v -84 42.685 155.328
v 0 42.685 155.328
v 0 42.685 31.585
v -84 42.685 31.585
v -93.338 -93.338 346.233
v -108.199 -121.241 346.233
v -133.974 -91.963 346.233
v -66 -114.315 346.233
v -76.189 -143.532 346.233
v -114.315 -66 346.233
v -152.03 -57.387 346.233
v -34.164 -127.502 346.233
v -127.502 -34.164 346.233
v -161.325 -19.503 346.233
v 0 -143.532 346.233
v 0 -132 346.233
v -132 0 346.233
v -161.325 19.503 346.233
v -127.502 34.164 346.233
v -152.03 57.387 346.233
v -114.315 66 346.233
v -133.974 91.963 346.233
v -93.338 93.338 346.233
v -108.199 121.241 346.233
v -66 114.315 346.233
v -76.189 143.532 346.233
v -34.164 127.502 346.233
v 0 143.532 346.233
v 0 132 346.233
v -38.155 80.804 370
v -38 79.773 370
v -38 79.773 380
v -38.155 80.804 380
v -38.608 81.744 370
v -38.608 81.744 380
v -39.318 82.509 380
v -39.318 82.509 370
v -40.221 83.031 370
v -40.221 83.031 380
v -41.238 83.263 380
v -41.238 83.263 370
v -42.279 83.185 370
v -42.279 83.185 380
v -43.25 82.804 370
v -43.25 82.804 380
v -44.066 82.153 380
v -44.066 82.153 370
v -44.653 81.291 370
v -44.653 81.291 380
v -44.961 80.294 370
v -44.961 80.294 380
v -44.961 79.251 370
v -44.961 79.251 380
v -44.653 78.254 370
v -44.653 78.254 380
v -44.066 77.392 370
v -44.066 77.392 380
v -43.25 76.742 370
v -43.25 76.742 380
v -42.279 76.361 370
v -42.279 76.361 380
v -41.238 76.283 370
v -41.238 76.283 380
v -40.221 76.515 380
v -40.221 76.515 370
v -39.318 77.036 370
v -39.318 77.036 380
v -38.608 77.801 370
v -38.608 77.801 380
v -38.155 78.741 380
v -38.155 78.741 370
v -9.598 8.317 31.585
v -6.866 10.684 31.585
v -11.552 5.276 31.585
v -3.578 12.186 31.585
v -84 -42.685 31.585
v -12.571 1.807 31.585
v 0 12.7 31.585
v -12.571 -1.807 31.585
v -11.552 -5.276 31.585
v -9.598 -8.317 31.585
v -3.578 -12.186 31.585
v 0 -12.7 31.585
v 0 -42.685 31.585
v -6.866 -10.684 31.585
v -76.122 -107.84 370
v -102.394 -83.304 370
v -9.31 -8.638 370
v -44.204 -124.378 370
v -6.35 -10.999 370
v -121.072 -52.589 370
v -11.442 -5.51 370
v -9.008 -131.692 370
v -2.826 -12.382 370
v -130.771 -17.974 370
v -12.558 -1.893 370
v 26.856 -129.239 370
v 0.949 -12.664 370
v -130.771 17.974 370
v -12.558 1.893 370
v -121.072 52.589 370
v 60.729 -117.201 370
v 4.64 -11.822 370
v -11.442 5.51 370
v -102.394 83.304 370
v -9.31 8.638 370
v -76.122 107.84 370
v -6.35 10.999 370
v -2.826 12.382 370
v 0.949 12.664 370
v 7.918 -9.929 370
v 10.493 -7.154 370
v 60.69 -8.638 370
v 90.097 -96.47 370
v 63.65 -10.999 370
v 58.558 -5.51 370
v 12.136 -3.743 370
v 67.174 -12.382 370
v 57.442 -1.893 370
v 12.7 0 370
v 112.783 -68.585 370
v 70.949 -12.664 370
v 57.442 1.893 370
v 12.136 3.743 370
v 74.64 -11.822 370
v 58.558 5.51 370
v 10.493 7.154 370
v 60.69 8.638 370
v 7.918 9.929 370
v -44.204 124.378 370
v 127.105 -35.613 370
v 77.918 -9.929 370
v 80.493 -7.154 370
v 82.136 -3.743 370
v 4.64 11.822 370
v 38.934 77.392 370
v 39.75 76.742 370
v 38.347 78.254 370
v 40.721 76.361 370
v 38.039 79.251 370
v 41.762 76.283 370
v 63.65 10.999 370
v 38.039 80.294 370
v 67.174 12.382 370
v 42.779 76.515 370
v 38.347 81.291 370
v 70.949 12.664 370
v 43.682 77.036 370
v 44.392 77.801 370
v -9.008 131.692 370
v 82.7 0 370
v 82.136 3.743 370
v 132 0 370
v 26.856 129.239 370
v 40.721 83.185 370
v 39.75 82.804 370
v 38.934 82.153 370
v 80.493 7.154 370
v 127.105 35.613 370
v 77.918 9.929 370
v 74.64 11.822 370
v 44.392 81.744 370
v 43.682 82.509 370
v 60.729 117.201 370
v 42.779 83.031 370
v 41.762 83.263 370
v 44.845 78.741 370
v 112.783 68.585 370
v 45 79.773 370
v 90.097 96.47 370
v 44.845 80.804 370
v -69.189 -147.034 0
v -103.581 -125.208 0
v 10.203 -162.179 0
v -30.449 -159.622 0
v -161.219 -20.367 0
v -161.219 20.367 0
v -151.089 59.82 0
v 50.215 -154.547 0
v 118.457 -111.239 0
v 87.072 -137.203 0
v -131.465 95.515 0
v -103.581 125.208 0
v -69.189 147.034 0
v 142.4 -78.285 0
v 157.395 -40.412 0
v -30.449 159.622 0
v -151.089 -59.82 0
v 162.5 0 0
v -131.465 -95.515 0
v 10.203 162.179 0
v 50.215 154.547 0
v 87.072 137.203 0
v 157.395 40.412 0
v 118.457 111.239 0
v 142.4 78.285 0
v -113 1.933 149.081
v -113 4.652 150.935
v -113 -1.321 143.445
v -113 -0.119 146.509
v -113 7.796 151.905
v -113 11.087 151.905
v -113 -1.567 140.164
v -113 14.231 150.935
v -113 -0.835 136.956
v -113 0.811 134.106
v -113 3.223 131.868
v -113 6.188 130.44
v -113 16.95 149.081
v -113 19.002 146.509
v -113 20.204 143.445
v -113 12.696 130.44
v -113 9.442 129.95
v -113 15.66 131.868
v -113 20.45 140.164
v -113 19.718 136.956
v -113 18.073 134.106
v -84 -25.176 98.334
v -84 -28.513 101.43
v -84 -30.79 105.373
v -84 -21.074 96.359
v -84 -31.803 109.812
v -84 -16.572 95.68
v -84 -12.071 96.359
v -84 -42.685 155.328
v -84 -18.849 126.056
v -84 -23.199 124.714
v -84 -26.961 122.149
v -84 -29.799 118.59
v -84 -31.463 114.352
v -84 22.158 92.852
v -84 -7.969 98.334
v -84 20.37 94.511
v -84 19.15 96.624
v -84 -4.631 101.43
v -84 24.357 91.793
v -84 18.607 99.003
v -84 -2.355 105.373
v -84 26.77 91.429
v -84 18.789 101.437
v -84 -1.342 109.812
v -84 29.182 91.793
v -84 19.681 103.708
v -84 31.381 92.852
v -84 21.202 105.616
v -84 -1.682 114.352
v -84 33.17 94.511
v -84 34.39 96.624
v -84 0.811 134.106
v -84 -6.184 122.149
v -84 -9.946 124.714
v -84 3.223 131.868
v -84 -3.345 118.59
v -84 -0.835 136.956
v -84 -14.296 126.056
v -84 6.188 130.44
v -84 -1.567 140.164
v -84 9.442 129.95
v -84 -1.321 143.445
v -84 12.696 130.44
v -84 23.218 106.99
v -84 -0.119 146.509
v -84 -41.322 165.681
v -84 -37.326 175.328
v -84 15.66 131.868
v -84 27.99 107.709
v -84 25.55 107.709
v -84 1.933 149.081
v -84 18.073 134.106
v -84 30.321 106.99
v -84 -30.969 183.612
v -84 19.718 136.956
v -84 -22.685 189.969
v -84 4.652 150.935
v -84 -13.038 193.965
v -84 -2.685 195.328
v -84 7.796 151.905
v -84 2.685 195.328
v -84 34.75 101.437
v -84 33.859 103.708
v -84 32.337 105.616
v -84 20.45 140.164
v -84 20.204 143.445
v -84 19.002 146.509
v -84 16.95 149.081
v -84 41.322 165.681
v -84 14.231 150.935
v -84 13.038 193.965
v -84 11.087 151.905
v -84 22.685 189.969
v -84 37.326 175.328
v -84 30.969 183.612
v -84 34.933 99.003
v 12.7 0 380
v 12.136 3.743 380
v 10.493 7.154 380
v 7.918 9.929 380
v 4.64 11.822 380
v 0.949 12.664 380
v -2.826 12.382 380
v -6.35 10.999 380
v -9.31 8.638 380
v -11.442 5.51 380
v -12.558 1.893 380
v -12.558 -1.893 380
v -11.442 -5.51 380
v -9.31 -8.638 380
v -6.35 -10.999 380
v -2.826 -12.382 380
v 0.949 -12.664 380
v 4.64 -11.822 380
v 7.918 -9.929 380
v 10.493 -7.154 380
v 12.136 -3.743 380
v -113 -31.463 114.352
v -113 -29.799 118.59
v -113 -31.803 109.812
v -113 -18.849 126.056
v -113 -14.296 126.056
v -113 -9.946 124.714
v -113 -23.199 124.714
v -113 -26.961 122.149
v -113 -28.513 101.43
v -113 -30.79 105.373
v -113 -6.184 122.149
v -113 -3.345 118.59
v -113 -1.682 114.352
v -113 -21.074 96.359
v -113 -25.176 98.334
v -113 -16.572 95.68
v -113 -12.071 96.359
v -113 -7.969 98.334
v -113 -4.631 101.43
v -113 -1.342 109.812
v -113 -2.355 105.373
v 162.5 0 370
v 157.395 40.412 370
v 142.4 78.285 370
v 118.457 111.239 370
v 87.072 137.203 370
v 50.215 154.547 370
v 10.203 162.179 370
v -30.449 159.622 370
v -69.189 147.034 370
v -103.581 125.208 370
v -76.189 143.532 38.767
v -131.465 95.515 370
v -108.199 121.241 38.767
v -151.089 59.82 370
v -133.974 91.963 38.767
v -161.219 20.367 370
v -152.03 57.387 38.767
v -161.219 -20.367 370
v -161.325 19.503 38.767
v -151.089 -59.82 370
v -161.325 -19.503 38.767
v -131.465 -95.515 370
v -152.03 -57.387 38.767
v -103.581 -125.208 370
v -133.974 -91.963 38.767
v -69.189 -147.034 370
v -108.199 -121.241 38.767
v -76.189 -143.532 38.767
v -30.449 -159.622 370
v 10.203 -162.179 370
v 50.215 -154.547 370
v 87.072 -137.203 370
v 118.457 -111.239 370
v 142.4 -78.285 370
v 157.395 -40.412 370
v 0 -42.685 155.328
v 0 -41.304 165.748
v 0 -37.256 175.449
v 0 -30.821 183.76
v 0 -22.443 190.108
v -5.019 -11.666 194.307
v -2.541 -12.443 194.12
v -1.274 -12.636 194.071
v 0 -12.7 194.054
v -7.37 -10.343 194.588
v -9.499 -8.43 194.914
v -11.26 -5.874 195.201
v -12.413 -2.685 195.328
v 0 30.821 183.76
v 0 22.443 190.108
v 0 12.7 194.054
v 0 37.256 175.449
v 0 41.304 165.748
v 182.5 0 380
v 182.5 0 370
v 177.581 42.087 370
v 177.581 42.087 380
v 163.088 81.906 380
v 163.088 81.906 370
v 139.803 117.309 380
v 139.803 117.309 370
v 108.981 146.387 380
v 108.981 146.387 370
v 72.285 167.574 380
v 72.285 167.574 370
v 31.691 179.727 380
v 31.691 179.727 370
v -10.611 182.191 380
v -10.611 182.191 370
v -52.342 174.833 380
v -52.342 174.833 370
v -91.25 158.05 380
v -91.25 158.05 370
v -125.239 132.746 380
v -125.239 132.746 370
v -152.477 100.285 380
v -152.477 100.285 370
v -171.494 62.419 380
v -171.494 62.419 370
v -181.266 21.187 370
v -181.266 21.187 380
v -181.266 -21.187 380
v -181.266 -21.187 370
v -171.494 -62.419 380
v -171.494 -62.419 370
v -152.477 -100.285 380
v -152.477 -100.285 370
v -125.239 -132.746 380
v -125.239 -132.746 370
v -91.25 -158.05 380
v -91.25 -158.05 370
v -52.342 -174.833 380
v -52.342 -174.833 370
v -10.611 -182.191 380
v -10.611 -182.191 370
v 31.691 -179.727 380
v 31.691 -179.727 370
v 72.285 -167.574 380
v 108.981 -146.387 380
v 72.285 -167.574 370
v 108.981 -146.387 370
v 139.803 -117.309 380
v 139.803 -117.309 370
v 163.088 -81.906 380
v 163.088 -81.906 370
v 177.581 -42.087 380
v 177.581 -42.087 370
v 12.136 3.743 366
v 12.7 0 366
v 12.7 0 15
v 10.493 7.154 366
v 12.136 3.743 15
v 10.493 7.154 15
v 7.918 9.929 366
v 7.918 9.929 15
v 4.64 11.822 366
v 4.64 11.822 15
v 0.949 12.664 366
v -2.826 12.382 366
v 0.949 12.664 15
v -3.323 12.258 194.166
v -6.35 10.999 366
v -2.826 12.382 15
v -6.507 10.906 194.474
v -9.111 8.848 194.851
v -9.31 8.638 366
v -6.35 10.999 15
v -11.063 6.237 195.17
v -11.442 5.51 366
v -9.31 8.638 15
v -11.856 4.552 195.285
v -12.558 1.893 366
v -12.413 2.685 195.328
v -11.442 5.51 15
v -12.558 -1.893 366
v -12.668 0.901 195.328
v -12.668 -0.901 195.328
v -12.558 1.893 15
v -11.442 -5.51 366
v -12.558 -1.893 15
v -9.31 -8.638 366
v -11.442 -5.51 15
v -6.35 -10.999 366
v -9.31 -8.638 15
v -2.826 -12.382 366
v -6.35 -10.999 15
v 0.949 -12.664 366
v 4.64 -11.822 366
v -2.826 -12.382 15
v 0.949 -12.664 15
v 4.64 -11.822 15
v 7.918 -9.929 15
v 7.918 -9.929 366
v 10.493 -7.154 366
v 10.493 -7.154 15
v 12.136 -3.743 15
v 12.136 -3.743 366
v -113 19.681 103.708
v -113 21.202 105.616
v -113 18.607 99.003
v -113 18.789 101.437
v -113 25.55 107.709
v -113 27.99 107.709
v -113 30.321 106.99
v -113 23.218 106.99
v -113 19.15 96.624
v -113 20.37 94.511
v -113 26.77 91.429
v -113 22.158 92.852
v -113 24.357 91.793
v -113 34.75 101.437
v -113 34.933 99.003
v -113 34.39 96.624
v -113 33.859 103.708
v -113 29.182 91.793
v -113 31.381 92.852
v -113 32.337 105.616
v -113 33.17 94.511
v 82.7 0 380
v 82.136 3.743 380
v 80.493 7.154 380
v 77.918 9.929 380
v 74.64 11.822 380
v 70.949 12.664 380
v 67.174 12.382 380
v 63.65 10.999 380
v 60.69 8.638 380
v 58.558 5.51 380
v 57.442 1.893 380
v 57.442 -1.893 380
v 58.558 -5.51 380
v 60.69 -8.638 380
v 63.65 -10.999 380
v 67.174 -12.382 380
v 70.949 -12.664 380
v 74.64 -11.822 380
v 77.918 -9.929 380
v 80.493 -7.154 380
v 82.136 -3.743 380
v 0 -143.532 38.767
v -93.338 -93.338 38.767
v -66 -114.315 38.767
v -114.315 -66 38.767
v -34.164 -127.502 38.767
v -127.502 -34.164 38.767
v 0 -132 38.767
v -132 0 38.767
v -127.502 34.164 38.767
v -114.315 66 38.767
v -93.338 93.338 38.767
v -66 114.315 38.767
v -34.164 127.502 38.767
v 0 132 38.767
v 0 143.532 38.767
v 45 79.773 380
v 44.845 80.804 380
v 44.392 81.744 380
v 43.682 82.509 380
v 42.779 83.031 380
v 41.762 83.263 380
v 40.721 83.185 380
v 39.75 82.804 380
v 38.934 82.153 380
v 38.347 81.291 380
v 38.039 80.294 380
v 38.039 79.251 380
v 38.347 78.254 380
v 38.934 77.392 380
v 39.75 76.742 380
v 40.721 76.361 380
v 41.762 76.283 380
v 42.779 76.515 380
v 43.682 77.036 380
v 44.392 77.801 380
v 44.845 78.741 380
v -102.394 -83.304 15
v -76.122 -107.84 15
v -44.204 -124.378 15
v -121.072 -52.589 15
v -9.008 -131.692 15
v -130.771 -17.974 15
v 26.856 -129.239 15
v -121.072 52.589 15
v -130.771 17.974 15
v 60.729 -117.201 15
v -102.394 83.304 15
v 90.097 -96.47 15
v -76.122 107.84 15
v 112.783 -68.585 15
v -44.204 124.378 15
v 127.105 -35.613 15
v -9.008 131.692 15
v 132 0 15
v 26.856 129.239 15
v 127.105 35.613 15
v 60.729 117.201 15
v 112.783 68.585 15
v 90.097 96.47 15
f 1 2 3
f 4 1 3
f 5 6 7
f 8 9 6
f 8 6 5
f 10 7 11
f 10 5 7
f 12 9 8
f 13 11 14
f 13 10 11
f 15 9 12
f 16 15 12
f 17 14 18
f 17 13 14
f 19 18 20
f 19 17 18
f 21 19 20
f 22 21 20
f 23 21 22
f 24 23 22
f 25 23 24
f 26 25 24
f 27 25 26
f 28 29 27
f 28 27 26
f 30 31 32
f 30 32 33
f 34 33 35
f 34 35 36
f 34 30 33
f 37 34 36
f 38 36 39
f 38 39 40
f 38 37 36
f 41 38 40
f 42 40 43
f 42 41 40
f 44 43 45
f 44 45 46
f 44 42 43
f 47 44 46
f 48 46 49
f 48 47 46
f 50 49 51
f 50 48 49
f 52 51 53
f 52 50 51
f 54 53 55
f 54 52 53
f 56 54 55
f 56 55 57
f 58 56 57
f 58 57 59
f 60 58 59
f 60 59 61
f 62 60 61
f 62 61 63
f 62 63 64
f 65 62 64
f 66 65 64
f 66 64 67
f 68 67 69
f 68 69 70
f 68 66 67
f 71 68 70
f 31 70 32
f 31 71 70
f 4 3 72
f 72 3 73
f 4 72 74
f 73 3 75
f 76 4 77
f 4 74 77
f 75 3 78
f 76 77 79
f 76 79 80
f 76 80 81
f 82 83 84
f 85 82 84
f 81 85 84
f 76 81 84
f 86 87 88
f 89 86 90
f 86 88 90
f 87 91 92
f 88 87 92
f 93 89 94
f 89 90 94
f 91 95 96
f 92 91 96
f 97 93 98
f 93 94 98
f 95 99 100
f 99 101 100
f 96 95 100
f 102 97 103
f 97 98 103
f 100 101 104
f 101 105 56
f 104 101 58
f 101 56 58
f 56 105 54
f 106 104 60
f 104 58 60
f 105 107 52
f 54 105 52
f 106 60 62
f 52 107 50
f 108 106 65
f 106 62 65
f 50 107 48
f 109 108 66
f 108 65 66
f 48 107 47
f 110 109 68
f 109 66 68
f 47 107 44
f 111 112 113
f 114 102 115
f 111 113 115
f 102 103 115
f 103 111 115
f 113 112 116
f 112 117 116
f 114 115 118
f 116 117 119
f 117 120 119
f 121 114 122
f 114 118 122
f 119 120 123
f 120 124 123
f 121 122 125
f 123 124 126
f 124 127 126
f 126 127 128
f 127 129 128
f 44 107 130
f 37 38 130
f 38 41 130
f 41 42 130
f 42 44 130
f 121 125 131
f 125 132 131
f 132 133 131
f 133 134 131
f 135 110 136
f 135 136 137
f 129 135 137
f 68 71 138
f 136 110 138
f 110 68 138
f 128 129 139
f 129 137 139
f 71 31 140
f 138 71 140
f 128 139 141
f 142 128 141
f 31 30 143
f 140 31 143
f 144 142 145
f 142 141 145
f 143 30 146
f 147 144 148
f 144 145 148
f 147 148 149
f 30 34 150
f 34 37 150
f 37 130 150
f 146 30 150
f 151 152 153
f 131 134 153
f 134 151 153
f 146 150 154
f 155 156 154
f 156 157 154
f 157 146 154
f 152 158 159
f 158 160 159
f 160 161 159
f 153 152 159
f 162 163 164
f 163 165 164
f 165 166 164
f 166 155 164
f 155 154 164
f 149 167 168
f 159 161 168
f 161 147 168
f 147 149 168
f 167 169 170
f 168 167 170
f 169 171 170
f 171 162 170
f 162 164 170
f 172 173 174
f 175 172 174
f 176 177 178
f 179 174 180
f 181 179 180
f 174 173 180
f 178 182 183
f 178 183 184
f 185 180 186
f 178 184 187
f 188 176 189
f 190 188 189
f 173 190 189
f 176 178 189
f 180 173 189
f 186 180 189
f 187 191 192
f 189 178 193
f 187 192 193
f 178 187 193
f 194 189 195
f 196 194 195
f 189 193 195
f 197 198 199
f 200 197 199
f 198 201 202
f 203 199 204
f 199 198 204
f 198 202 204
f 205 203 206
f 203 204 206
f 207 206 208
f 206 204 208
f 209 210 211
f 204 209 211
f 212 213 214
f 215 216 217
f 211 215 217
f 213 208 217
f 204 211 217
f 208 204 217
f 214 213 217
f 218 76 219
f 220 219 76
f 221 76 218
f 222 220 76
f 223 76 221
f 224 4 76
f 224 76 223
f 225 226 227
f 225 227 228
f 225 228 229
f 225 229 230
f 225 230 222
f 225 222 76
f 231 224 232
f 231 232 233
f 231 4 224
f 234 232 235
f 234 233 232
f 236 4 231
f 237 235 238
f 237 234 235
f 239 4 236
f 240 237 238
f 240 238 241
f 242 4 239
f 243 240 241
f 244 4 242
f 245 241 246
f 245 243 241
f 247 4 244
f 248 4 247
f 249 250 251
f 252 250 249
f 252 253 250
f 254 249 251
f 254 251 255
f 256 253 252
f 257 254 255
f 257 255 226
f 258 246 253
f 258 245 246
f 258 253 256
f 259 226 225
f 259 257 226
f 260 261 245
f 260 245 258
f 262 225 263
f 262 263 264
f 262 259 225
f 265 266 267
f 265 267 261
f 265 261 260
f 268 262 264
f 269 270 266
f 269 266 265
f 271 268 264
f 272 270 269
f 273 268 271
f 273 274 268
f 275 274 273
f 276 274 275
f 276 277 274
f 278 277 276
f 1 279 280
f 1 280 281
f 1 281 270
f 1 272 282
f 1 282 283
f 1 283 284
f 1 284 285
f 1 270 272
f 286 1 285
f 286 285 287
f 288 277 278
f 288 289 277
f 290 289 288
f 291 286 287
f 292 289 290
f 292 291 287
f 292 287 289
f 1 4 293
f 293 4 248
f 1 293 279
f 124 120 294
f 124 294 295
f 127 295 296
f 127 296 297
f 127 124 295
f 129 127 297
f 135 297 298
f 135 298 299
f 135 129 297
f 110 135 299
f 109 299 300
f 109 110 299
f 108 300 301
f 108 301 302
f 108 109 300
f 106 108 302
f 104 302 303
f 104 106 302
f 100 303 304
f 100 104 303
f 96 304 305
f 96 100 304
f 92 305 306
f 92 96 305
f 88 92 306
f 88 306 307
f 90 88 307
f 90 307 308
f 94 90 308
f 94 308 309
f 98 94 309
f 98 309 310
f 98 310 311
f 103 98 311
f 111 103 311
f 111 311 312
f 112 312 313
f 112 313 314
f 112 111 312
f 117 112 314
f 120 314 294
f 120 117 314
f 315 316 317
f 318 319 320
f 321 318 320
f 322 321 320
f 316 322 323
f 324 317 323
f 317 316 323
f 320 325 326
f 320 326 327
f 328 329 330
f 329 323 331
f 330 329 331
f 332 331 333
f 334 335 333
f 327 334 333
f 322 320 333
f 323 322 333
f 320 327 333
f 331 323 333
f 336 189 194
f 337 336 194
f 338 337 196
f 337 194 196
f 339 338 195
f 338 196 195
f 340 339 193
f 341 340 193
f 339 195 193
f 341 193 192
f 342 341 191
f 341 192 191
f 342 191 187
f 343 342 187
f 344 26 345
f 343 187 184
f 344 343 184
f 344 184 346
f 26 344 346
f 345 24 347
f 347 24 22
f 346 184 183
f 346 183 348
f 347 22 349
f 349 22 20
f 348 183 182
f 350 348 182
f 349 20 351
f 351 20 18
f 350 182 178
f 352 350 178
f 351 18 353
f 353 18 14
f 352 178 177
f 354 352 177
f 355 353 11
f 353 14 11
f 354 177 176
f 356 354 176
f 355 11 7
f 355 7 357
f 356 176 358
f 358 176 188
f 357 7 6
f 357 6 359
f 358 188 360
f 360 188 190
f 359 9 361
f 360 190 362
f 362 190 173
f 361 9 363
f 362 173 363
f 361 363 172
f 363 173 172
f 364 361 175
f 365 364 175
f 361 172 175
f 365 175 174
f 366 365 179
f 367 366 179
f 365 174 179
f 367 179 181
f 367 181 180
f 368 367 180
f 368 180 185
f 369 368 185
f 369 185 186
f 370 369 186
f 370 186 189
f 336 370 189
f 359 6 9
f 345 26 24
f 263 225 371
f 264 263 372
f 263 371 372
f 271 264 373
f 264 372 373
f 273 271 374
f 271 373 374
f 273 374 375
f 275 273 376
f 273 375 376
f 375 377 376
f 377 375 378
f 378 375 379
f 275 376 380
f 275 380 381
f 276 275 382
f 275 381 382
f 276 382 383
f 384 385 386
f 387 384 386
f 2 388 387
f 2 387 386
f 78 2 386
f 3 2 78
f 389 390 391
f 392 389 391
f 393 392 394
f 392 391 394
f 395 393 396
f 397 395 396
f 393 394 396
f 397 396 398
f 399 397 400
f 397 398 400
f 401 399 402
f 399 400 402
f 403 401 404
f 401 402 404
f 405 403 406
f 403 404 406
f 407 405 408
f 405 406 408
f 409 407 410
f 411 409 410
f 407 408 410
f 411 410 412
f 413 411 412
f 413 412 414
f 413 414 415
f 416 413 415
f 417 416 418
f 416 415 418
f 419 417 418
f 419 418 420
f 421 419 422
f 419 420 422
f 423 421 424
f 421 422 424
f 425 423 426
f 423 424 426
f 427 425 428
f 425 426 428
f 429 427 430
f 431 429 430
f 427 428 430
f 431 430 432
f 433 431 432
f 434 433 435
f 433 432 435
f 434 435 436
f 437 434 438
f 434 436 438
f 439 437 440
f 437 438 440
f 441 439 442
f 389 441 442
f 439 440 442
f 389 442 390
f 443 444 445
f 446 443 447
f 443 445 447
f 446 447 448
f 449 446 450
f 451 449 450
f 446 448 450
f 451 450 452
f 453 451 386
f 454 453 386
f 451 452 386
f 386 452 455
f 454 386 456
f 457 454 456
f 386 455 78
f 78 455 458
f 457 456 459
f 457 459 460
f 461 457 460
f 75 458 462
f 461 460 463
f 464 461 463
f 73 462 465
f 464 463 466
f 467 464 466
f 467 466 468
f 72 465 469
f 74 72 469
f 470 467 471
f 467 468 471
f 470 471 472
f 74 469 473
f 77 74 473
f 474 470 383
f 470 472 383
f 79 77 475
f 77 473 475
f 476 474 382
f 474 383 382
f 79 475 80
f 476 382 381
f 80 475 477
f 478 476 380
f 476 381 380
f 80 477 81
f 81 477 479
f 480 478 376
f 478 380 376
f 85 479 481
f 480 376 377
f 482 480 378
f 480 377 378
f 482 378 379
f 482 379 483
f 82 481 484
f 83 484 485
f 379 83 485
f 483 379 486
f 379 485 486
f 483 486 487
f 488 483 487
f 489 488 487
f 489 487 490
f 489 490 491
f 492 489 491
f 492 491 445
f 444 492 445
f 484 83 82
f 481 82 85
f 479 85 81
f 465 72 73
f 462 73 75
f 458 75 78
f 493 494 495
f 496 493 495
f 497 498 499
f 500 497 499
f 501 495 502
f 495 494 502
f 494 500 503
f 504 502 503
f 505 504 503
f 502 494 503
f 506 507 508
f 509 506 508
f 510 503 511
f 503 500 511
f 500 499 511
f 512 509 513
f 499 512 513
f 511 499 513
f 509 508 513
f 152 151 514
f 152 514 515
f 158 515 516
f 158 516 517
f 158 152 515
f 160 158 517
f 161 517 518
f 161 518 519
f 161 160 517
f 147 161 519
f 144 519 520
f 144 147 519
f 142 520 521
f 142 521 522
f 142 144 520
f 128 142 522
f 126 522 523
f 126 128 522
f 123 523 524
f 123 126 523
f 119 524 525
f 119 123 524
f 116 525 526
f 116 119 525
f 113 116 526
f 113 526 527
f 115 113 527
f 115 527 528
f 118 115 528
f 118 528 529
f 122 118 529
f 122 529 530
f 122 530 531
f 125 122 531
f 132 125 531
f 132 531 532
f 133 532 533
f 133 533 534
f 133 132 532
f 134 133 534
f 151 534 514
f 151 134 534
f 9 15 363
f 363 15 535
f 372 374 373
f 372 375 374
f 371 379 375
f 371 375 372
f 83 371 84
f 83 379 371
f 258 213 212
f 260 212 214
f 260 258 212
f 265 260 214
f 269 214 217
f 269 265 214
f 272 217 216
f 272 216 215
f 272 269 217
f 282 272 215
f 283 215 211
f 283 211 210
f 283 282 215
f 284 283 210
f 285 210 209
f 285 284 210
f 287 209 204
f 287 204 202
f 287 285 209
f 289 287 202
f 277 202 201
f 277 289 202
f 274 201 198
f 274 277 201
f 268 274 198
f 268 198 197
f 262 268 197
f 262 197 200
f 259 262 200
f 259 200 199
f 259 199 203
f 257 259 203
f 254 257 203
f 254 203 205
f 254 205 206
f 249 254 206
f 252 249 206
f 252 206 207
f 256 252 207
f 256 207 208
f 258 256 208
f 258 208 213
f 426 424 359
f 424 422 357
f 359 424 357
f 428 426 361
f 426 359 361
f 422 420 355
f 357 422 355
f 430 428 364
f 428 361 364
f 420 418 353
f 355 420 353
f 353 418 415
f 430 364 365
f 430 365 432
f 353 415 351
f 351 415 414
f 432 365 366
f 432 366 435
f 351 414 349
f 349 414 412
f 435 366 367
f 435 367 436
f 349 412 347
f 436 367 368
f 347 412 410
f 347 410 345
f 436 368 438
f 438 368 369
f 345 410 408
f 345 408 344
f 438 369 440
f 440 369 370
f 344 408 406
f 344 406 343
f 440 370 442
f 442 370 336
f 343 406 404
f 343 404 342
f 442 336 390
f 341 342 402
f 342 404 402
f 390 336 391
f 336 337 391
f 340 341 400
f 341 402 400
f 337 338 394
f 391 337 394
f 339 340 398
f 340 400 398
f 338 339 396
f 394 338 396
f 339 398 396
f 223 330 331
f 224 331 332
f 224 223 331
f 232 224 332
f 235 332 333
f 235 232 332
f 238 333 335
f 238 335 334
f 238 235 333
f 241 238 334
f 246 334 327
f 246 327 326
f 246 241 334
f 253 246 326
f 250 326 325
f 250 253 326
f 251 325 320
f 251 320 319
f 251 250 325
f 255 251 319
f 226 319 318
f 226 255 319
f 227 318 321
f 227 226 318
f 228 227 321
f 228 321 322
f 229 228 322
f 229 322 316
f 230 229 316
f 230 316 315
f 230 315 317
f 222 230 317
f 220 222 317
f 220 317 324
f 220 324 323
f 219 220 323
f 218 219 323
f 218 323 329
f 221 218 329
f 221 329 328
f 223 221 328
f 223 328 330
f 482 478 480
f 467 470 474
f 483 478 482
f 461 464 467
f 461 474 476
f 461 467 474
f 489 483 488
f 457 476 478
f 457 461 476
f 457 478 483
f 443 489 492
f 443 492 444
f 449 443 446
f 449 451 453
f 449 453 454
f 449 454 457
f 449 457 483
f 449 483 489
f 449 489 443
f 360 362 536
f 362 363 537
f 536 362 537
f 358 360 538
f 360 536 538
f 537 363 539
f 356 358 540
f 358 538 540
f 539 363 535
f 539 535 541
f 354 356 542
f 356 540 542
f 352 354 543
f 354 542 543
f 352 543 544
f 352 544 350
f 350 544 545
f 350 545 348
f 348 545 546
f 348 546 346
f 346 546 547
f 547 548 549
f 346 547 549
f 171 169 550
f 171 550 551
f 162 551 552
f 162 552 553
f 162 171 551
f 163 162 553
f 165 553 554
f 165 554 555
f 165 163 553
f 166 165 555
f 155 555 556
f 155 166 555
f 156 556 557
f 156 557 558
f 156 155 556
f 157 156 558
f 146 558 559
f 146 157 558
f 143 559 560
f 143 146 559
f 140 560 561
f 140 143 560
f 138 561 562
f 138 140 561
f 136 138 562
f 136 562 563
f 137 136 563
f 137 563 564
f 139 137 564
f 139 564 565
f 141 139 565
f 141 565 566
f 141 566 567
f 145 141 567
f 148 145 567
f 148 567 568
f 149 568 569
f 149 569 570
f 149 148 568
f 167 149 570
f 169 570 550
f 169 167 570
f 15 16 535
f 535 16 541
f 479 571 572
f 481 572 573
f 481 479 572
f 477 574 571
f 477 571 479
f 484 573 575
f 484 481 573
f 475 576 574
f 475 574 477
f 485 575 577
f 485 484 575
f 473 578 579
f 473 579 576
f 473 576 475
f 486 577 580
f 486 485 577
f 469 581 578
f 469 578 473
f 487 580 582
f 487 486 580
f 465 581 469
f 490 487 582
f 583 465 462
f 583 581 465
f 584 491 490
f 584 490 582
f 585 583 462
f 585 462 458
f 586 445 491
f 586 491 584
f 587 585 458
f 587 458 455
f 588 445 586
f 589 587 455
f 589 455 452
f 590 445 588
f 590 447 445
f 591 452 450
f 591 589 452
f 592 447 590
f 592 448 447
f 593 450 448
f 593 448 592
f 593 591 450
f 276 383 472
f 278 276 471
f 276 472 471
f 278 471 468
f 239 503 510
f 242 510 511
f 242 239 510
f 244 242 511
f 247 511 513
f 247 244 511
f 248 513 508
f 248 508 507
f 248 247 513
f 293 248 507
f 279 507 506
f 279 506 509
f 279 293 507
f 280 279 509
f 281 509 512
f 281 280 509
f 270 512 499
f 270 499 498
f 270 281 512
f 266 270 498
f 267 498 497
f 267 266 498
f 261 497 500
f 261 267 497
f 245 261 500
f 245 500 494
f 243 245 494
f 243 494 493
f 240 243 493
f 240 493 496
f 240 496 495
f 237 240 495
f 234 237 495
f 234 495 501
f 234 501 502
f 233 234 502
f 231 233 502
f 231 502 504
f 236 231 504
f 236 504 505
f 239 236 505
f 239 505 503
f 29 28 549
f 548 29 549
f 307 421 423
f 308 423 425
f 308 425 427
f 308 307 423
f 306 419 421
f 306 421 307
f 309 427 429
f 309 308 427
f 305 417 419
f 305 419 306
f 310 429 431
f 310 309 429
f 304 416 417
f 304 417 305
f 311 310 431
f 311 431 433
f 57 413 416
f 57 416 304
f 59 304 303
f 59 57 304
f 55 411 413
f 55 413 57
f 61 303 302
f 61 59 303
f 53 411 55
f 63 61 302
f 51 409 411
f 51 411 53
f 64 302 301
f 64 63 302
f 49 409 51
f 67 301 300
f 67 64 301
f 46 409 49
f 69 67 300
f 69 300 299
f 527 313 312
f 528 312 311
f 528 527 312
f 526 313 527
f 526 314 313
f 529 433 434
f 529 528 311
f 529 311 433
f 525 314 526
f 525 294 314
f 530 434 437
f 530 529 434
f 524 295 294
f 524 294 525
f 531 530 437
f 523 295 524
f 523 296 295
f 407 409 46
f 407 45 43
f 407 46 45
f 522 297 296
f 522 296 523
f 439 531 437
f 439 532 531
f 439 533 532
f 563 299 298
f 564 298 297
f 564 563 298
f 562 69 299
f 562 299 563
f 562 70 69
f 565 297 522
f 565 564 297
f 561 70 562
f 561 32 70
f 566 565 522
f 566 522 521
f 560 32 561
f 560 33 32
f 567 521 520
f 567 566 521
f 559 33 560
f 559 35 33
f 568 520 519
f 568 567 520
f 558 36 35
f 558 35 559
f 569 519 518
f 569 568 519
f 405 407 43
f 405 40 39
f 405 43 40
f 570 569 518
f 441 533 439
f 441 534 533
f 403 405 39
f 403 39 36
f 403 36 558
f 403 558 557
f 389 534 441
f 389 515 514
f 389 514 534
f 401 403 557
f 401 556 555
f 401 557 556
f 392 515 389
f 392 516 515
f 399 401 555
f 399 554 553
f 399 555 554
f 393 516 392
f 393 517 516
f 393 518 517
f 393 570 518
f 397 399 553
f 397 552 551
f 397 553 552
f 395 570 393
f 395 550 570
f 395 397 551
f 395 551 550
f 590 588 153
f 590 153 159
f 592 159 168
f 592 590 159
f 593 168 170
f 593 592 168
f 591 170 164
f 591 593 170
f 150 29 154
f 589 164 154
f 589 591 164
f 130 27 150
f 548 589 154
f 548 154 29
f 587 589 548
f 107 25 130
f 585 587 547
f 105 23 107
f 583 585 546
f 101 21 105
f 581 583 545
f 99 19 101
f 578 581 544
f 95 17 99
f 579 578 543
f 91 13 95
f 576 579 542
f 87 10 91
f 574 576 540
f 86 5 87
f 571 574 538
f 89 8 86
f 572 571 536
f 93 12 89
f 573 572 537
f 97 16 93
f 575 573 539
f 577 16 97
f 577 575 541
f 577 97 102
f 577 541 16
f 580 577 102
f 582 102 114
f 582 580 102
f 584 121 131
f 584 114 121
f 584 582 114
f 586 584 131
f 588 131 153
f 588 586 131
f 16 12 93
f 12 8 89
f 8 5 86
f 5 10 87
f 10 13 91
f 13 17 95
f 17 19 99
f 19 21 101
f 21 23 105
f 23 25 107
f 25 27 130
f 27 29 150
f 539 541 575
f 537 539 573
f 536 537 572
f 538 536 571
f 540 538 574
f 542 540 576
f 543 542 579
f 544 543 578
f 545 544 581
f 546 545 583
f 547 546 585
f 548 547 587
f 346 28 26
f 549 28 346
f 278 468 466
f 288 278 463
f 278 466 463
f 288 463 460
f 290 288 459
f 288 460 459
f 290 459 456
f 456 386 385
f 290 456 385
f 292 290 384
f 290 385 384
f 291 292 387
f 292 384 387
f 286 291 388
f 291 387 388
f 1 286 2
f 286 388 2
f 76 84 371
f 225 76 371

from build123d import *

# Parameters (mm, degrees)
CROQUIS1_R              = 162.5
SALIENTE_EXTRUIR1_DEPTH = 370
CROQUIS2_R              = 132
CORTAR_EXTRUIR1_DEPTH   = 417
CROQUIS3_W              = 307.465117838
CROQUIS3_H              = 287.064574964
CORTAR_EXTRUIR2_DEPTH   = 417
CROQUIS4_R              = 182.5
CROQUIS4_R_2            = 12.7
CROQUIS4_R_3            = 3.5
SALIENTE_EXTRUIR2_DEPTH = 10
SALIENTE_EXTRUIR3_DEPTH = 84
CROQUIS6_R              = 11.039446922
CROQUIS6_R_2            = 15.273211948
CROQUIS6_R_3            = 8.18574154
SALIENTE_EXTRUIR4_DEPTH = 113
CROQUIS7_R              = 12.7
SALIENTE_EXTRUIR5_DEPTH = 351


with BuildPart() as part:
    # Croquis1 → Saliente-Extruir1 (new body)
    with BuildSketch(Plane.XY):
        Circle(CROQUIS1_R)
    extrude(amount=SALIENTE_EXTRUIR1_DEPTH)

    # Croquis2 → Cortar-Extruir1 (cut)
    with BuildSketch(Plane.XY.offset(15)):
        Circle(CROQUIS2_R)
    extrude(amount=CORTAR_EXTRUIR1_DEPTH, mode=Mode.SUBTRACT)

    # Croquis3 → Cortar-Extruir2 (cut)
    with BuildSketch(Plane(origin=(0, 0, 0), x_dir=(0, 0, -1), z_dir=(1, 0, 0))):
        with Locations((-192.5, 0)):
            Rectangle(CROQUIS3_W, CROQUIS3_H)
    extrude(amount=-CORTAR_EXTRUIR2_DEPTH, mode=Mode.SUBTRACT)

    # Croquis4 → Saliente-Extruir2 (add)
    with BuildSketch(Plane.XY.offset(370)):
        Circle(CROQUIS4_R)
        Circle(CROQUIS4_R_2, mode=Mode.SUBTRACT)
        with Locations((70, 0)):
            Circle(CROQUIS4_R_2, mode=Mode.SUBTRACT)
        with Locations((-41.5, 79.772762666)):
            Circle(CROQUIS4_R_3, mode=Mode.SUBTRACT)
        with Locations((41.5, 79.772762666)):
            Circle(CROQUIS4_R_3, mode=Mode.SUBTRACT)
    extrude(amount=SALIENTE_EXTRUIR2_DEPTH)



with BuildPart() as body_2:
    # Croquis5 → Saliente-Extruir3 (new body)
    with BuildSketch(Plane(origin=(0, 0, 0), x_dir=(0, 0, -1), z_dir=(1, 0, 0))):
        with BuildLine():
            Line((-155.328170247, 42.685027874), (-31.585382794, 42.685027874))
            Line((-31.585382794, 42.685027874), (-31.585382794, -42.685027874))
            Line((-31.585382794, -42.685027874), (-155.328170247, -42.685027874))
            ThreePointArc((-155.328170247, -42.685027874), (-183.612441494, -30.969299122), (-195.328170247, -2.685027874))
            Line((-195.328170247, -2.685027874), (-195.328170247, 2.685027874))
            ThreePointArc((-195.328170247, 2.685027874), (-183.612441494, 30.969299122), (-155.328170247, 42.685027874))
        make_face()
    extrude(amount=-SALIENTE_EXTRUIR3_DEPTH)

    # Croquis6 → Saliente-Extruir4 (add)
    with BuildSketch(Plane(origin=(0, 0, 0), x_dir=(0, 0, -1), z_dir=(1, 0, 0))):
        with Locations((-140.988957086, 9.44161276)):
            Circle(CROQUIS6_R)
        with Locations((-110.953177837, -16.572410972)):
            Circle(CROQUIS6_R_2)
        with Locations((-99.615024167, 26.769678135)):
            Circle(CROQUIS6_R_3)
    extrude(amount=-SALIENTE_EXTRUIR4_DEPTH)


with BuildPart() as part_1:
    add(part.part)

    add(body_2.part)  # Saliente-Extruir5 merges body 2
    # Croquis7 → Saliente-Extruir5 (add)
    with BuildSketch(Plane.XY.offset(15)):
        Circle(CROQUIS7_R)
    extrude(amount=SALIENTE_EXTRUIR5_DEPTH)


solid = part_1.part
